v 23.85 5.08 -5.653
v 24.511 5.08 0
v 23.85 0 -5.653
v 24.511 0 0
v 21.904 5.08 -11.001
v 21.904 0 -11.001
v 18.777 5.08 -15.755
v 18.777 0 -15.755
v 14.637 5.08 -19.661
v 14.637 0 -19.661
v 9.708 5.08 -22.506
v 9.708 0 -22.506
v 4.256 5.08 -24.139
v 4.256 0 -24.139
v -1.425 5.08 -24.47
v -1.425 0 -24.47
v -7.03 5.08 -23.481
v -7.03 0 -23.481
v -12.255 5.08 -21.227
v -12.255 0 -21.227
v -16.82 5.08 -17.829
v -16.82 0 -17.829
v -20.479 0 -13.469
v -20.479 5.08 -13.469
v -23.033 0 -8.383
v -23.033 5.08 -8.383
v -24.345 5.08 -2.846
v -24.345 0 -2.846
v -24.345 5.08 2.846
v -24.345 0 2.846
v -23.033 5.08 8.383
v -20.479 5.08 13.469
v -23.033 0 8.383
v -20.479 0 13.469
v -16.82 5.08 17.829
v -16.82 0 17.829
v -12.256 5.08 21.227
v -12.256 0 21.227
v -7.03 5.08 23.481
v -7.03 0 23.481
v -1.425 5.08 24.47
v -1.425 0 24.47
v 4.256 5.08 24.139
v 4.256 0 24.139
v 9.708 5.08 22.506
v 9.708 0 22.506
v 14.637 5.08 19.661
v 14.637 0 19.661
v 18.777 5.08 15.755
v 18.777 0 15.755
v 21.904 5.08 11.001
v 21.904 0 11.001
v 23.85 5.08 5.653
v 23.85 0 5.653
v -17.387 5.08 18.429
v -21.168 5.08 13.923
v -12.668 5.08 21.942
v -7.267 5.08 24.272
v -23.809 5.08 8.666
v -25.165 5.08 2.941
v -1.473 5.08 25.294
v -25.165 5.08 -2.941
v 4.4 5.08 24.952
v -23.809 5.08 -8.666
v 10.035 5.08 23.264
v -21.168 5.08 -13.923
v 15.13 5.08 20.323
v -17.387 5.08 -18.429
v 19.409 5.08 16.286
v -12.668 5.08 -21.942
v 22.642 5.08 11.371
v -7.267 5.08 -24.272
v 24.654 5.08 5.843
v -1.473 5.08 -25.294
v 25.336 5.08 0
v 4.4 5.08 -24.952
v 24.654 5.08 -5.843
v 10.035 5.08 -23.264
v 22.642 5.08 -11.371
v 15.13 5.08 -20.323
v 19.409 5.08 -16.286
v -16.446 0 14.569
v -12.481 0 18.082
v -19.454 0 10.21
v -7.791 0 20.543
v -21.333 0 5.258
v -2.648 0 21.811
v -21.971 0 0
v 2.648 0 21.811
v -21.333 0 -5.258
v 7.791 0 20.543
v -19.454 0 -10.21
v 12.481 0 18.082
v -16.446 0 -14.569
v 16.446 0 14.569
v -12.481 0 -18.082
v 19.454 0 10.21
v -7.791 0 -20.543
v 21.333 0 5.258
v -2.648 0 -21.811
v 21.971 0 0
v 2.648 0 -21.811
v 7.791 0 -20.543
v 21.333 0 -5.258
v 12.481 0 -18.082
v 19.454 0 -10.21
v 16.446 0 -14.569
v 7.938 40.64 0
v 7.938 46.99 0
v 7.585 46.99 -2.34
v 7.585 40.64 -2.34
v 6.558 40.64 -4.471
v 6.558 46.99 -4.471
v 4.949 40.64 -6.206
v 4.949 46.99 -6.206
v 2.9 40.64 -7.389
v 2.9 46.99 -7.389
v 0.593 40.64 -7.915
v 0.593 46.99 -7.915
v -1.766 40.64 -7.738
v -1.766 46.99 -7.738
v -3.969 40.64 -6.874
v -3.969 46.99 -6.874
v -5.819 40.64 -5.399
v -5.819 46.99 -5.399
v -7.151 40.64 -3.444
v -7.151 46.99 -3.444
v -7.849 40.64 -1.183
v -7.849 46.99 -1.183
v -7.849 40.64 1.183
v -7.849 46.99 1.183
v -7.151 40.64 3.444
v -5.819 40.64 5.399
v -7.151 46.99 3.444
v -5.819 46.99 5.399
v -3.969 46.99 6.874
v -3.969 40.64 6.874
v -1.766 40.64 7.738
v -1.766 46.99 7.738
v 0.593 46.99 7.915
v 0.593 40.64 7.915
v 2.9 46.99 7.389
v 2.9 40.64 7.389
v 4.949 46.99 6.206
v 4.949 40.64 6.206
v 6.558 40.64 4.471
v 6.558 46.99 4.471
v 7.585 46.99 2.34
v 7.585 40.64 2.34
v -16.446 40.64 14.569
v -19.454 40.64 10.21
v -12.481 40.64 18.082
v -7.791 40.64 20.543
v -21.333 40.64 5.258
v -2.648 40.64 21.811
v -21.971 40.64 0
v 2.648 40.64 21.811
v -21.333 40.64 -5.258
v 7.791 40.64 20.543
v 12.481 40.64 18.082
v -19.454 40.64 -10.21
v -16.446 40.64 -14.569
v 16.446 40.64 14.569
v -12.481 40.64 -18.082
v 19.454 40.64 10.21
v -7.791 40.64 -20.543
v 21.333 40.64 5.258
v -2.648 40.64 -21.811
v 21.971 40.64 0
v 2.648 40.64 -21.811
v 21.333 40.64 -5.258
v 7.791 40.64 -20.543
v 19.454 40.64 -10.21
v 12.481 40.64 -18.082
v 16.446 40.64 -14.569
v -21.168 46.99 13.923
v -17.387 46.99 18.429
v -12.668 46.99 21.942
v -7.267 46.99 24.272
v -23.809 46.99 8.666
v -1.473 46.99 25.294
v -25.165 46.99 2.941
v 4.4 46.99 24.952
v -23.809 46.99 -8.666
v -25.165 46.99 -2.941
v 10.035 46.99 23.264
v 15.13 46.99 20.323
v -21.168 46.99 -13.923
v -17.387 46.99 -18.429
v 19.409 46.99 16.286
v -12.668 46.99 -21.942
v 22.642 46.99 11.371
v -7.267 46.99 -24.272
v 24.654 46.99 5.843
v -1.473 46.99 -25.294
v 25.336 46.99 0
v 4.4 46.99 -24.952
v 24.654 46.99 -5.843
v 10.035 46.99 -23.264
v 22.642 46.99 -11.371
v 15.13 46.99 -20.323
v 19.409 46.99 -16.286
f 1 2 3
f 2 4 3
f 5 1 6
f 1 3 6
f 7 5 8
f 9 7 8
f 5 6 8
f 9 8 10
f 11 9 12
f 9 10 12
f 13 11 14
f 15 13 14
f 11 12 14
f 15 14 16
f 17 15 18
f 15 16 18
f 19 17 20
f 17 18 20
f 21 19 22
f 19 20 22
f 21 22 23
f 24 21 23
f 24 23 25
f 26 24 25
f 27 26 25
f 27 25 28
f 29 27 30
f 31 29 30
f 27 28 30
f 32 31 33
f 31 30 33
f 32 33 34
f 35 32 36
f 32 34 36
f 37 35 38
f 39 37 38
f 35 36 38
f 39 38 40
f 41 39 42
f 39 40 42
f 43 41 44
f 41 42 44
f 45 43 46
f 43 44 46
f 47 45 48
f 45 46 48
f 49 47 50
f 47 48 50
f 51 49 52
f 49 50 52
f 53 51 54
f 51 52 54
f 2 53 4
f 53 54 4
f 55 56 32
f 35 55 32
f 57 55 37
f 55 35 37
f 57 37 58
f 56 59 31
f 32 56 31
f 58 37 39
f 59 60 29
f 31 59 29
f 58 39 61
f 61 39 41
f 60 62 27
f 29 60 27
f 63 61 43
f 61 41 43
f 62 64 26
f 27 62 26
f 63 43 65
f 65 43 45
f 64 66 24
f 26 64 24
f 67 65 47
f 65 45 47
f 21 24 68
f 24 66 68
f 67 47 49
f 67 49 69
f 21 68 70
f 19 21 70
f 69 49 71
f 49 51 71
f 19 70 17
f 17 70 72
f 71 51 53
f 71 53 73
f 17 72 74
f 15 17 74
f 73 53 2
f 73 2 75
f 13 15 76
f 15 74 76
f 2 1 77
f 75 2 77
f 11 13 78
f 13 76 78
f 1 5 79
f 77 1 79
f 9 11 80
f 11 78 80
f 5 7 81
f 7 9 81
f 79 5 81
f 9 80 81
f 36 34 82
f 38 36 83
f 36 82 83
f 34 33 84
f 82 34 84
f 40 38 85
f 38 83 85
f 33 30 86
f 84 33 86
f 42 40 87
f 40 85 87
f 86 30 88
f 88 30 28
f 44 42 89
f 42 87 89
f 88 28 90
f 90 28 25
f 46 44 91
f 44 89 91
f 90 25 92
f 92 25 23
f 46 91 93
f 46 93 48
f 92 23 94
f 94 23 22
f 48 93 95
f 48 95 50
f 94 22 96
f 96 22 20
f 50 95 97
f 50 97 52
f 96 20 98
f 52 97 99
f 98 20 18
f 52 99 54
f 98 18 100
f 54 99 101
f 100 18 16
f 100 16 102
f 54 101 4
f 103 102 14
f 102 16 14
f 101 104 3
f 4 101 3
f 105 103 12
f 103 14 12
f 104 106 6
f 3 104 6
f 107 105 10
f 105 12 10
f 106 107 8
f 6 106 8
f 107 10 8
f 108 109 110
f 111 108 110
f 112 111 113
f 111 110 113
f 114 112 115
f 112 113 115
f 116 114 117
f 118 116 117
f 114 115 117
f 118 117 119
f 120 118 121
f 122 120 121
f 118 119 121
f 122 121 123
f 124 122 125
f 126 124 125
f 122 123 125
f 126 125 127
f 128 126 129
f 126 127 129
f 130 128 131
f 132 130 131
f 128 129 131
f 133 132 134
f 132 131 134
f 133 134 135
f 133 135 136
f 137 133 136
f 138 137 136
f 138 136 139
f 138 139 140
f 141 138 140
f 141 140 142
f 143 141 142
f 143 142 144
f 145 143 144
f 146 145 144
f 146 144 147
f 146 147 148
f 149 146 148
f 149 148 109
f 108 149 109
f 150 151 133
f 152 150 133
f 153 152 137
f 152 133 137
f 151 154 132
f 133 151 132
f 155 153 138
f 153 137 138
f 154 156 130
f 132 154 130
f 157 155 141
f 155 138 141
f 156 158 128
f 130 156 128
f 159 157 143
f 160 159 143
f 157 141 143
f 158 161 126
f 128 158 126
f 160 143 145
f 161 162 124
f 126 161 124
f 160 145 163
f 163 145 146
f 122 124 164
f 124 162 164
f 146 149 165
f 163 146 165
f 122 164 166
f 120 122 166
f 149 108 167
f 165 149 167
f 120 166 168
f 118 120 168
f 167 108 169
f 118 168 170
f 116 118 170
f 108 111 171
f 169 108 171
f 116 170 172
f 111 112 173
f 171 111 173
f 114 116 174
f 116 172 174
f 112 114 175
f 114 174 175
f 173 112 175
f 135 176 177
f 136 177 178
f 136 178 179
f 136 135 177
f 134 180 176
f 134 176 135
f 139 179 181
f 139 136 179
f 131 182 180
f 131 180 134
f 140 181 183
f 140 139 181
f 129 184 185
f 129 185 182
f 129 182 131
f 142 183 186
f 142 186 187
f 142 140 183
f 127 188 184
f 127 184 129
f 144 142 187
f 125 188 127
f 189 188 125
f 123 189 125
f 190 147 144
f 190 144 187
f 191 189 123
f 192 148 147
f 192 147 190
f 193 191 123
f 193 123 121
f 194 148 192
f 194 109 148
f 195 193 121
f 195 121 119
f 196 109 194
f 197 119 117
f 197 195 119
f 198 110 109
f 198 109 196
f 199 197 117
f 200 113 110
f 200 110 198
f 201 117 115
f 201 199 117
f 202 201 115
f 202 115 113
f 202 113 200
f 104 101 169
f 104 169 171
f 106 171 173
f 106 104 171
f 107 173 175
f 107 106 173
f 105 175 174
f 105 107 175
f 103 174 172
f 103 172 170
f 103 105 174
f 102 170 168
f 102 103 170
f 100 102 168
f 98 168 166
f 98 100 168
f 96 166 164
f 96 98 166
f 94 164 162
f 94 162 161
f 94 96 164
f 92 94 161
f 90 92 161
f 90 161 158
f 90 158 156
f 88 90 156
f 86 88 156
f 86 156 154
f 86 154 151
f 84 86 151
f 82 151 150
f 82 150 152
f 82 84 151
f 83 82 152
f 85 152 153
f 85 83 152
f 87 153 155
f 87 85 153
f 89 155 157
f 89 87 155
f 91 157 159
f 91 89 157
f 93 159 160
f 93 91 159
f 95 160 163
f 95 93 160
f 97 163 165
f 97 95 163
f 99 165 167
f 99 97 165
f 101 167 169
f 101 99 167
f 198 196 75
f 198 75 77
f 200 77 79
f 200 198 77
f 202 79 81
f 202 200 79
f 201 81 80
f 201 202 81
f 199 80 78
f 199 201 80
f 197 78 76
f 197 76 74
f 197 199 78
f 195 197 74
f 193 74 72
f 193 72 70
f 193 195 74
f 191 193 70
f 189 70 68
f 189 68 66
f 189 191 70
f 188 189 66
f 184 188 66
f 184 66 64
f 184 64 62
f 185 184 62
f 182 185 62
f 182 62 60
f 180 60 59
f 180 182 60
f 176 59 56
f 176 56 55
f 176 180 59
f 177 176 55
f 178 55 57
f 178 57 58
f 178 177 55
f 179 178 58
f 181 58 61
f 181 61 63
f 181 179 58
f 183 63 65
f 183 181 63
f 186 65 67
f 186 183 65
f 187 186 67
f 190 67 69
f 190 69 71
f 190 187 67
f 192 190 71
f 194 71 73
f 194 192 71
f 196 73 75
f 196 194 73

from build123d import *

# Parameters (mm, degrees)
SKETCH1_R           = 24.511
SKETCH1_R_2         = 21.971
BOSS_EXTRUDE1_DEPTH = 40.64
SKETCH2_R           = 24.511
BOSS_EXTRUDE2_DEPTH = 6.35
CUT_EXTRUDE1_REACH  = 48.99
SKETCH3_R           = 7.9375
SKETCH4_R           = 25.3365
SKETCH4_R_2         = 24.511
BOSS_EXTRUDE3_DEPTH = 41.91


with BuildPart() as part:
    # Sketch1 → Boss-Extrude1 (new body)
    with BuildSketch(Plane(origin=(0, 0, 0), x_dir=(1, 0, 0), z_dir=(0, 1, 0))):
        Circle(SKETCH1_R)
        Circle(SKETCH1_R_2, mode=Mode.SUBTRACT)
    extrude(amount=BOSS_EXTRUDE1_DEPTH)

    # Sketch2 → Boss-Extrude2 (add)
    with BuildSketch(Plane(origin=(0, 40.64, 0), x_dir=(1, 0, 0), z_dir=(0, 1, 0))):
        Circle(SKETCH2_R)
    extrude(amount=BOSS_EXTRUDE2_DEPTH)

    # Sketch3 → Cut-Extrude1 (cut, up to next)
    with BuildSketch(Plane(origin=(0, 46.99, 0), x_dir=(1, 0, 0), z_dir=(0, 1, 0)), mode=Mode.PRIVATE) as cut_extrude1_sk1:
        Circle(SKETCH3_R)
    cut_extrude1_tool1 = extrude(cut_extrude1_sk1.sketch, amount=-CUT_EXTRUDE1_REACH, mode=Mode.PRIVATE) & part.part
    add(cut_extrude1_tool1.solids().sort_by_distance((0, 46.99, 0))[0], mode=Mode.SUBTRACT)

    # Sketch4 → Boss-Extrude3 (add)
    with BuildSketch(Plane(origin=(0, 46.99, 0), x_dir=(1, 0, 0), z_dir=(0, 1, 0))):
        Circle(SKETCH4_R)
        Circle(SKETCH4_R_2, mode=Mode.SUBTRACT)
    extrude(amount=-BOSS_EXTRUDE3_DEPTH)


solid = part.part
